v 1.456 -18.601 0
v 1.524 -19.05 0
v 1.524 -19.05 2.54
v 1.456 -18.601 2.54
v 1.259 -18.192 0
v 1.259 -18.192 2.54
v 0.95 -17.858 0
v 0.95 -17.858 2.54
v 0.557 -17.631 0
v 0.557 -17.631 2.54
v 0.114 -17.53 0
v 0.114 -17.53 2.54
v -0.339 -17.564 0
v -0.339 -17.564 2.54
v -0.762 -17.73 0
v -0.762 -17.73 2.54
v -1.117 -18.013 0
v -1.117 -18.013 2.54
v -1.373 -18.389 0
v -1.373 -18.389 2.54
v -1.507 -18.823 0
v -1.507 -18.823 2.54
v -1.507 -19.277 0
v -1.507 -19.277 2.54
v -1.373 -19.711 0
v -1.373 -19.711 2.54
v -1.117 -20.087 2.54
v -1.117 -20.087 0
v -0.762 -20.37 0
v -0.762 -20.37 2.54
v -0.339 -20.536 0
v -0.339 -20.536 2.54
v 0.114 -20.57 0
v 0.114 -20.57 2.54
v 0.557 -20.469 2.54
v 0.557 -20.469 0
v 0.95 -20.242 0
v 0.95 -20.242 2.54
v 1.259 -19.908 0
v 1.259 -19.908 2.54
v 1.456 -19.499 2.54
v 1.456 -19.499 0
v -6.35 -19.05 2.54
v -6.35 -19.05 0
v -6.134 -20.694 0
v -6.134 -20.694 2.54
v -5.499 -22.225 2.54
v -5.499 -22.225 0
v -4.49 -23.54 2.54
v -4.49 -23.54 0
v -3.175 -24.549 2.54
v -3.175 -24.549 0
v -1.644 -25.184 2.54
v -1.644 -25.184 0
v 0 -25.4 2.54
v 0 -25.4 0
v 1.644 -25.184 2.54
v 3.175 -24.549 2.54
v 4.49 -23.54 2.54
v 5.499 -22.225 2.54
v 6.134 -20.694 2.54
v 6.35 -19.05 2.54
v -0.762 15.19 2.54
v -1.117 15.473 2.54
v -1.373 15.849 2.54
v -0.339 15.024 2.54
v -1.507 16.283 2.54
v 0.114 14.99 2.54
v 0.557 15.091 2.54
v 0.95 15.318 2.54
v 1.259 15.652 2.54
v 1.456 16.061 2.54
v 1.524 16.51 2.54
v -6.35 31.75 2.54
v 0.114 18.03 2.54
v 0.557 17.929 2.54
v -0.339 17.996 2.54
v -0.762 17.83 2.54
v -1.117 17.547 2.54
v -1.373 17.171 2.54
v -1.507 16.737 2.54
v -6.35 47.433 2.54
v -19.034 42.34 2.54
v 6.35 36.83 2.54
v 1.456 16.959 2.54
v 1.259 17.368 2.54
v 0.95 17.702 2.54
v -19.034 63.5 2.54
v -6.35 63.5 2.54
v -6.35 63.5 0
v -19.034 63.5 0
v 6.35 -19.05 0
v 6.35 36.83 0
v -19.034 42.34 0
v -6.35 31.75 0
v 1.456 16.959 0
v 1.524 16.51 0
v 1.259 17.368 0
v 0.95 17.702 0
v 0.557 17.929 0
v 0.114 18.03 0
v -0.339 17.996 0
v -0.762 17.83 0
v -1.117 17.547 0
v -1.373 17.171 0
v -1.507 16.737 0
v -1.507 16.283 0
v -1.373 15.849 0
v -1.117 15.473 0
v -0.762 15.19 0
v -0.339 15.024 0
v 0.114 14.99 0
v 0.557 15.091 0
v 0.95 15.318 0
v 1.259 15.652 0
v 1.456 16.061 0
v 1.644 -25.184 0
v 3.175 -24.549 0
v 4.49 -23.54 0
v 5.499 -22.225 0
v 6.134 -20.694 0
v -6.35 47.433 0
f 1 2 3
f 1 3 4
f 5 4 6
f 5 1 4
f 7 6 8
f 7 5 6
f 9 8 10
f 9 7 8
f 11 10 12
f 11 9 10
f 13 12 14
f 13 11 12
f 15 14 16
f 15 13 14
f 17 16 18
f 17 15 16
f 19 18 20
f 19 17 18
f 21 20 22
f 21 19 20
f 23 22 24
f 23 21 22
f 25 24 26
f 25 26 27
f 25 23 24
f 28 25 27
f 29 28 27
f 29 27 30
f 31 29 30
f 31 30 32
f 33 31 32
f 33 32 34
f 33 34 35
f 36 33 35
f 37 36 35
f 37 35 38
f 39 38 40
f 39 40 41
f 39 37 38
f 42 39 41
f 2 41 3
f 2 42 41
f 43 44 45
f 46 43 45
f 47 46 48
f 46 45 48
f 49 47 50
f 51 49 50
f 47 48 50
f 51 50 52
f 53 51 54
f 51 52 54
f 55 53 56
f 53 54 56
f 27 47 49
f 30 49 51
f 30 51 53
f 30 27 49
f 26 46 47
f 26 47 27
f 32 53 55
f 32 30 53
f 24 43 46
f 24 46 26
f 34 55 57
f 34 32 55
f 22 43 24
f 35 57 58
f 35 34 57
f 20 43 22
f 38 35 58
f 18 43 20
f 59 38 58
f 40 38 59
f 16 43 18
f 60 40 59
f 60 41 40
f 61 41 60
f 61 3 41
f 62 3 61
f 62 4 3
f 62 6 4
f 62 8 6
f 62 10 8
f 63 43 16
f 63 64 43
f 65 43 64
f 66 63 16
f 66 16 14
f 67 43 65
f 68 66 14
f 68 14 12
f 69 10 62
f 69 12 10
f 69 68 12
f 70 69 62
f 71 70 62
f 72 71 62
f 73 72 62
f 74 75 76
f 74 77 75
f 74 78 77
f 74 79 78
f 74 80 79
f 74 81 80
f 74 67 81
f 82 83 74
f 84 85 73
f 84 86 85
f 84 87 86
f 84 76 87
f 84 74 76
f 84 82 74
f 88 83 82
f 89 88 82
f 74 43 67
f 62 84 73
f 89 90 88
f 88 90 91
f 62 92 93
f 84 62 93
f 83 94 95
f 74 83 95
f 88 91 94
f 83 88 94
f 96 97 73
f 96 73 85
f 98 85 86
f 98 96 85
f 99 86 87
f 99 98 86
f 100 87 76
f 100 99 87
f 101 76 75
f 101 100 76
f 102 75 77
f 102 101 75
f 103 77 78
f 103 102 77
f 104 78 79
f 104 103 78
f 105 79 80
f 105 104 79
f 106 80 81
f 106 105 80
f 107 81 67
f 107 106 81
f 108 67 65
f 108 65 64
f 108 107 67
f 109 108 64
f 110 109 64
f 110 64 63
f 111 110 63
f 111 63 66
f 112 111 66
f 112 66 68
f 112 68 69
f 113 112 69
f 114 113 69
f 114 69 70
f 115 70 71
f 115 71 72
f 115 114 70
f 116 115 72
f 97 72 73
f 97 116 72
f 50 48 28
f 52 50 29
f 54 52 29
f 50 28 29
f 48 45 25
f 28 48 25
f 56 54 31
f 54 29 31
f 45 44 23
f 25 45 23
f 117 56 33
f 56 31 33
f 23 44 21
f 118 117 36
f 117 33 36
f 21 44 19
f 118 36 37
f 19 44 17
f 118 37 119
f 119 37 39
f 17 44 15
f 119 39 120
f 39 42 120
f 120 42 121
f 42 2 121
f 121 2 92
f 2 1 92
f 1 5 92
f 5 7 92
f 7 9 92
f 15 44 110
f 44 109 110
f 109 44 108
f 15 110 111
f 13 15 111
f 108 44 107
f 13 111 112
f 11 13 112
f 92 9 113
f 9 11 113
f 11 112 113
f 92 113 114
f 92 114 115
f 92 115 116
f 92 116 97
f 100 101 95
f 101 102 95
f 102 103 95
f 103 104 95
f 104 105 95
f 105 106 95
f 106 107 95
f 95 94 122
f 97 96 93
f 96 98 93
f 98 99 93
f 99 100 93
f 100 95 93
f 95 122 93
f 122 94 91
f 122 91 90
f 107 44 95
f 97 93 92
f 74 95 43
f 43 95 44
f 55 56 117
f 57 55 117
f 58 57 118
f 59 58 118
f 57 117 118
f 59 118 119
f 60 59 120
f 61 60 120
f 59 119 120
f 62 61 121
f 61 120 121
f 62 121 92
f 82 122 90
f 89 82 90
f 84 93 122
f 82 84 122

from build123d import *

# Parameters (mm, degrees)
F0_R     = 1.524
F1_DEPTH = 2.54


# Not quite as in the source:
# - a feature names something its author has since deleted; it is built from what else it names


with BuildPart() as f1:
    # F0 (on Top) → F1 (new body)
    with BuildSketch(Plane.XY):
        with BuildLine():
            Line((-19.0341994166, 42.3401940286), (-6.35, 31.75))
            Line((-6.35, 31.75), (-6.35, -19.05))
            ThreePointArc((-6.35, -19.05), (-4.4901280605, -23.5401280605), (0, -25.4))
            ThreePointArc((0, -25.4), (4.4901280605, -23.5401280605), (6.35, -19.05))
            Line((6.35, -19.05), (6.35, 36.83))
            Line((6.35, 36.83), (-6.35, 47.4333861299))
            Line((-6.35, 47.4333861299), (-6.35, 57.15))
            Line((-6.35, 57.15), (-6.35, 63.5))
            Line((-6.35, 63.5), (-19.0341994166, 63.5))
            Line((-19.0341994166, 63.5), (-19.0341994166, 42.3401940286))
        make_face()
        with Locations((0, -19.05)):
            Circle(F0_R, mode=Mode.SUBTRACT)
        with Locations((0, 16.51)):
            Circle(F0_R, mode=Mode.SUBTRACT)
    extrude(amount=F1_DEPTH)


solid = f1.part
